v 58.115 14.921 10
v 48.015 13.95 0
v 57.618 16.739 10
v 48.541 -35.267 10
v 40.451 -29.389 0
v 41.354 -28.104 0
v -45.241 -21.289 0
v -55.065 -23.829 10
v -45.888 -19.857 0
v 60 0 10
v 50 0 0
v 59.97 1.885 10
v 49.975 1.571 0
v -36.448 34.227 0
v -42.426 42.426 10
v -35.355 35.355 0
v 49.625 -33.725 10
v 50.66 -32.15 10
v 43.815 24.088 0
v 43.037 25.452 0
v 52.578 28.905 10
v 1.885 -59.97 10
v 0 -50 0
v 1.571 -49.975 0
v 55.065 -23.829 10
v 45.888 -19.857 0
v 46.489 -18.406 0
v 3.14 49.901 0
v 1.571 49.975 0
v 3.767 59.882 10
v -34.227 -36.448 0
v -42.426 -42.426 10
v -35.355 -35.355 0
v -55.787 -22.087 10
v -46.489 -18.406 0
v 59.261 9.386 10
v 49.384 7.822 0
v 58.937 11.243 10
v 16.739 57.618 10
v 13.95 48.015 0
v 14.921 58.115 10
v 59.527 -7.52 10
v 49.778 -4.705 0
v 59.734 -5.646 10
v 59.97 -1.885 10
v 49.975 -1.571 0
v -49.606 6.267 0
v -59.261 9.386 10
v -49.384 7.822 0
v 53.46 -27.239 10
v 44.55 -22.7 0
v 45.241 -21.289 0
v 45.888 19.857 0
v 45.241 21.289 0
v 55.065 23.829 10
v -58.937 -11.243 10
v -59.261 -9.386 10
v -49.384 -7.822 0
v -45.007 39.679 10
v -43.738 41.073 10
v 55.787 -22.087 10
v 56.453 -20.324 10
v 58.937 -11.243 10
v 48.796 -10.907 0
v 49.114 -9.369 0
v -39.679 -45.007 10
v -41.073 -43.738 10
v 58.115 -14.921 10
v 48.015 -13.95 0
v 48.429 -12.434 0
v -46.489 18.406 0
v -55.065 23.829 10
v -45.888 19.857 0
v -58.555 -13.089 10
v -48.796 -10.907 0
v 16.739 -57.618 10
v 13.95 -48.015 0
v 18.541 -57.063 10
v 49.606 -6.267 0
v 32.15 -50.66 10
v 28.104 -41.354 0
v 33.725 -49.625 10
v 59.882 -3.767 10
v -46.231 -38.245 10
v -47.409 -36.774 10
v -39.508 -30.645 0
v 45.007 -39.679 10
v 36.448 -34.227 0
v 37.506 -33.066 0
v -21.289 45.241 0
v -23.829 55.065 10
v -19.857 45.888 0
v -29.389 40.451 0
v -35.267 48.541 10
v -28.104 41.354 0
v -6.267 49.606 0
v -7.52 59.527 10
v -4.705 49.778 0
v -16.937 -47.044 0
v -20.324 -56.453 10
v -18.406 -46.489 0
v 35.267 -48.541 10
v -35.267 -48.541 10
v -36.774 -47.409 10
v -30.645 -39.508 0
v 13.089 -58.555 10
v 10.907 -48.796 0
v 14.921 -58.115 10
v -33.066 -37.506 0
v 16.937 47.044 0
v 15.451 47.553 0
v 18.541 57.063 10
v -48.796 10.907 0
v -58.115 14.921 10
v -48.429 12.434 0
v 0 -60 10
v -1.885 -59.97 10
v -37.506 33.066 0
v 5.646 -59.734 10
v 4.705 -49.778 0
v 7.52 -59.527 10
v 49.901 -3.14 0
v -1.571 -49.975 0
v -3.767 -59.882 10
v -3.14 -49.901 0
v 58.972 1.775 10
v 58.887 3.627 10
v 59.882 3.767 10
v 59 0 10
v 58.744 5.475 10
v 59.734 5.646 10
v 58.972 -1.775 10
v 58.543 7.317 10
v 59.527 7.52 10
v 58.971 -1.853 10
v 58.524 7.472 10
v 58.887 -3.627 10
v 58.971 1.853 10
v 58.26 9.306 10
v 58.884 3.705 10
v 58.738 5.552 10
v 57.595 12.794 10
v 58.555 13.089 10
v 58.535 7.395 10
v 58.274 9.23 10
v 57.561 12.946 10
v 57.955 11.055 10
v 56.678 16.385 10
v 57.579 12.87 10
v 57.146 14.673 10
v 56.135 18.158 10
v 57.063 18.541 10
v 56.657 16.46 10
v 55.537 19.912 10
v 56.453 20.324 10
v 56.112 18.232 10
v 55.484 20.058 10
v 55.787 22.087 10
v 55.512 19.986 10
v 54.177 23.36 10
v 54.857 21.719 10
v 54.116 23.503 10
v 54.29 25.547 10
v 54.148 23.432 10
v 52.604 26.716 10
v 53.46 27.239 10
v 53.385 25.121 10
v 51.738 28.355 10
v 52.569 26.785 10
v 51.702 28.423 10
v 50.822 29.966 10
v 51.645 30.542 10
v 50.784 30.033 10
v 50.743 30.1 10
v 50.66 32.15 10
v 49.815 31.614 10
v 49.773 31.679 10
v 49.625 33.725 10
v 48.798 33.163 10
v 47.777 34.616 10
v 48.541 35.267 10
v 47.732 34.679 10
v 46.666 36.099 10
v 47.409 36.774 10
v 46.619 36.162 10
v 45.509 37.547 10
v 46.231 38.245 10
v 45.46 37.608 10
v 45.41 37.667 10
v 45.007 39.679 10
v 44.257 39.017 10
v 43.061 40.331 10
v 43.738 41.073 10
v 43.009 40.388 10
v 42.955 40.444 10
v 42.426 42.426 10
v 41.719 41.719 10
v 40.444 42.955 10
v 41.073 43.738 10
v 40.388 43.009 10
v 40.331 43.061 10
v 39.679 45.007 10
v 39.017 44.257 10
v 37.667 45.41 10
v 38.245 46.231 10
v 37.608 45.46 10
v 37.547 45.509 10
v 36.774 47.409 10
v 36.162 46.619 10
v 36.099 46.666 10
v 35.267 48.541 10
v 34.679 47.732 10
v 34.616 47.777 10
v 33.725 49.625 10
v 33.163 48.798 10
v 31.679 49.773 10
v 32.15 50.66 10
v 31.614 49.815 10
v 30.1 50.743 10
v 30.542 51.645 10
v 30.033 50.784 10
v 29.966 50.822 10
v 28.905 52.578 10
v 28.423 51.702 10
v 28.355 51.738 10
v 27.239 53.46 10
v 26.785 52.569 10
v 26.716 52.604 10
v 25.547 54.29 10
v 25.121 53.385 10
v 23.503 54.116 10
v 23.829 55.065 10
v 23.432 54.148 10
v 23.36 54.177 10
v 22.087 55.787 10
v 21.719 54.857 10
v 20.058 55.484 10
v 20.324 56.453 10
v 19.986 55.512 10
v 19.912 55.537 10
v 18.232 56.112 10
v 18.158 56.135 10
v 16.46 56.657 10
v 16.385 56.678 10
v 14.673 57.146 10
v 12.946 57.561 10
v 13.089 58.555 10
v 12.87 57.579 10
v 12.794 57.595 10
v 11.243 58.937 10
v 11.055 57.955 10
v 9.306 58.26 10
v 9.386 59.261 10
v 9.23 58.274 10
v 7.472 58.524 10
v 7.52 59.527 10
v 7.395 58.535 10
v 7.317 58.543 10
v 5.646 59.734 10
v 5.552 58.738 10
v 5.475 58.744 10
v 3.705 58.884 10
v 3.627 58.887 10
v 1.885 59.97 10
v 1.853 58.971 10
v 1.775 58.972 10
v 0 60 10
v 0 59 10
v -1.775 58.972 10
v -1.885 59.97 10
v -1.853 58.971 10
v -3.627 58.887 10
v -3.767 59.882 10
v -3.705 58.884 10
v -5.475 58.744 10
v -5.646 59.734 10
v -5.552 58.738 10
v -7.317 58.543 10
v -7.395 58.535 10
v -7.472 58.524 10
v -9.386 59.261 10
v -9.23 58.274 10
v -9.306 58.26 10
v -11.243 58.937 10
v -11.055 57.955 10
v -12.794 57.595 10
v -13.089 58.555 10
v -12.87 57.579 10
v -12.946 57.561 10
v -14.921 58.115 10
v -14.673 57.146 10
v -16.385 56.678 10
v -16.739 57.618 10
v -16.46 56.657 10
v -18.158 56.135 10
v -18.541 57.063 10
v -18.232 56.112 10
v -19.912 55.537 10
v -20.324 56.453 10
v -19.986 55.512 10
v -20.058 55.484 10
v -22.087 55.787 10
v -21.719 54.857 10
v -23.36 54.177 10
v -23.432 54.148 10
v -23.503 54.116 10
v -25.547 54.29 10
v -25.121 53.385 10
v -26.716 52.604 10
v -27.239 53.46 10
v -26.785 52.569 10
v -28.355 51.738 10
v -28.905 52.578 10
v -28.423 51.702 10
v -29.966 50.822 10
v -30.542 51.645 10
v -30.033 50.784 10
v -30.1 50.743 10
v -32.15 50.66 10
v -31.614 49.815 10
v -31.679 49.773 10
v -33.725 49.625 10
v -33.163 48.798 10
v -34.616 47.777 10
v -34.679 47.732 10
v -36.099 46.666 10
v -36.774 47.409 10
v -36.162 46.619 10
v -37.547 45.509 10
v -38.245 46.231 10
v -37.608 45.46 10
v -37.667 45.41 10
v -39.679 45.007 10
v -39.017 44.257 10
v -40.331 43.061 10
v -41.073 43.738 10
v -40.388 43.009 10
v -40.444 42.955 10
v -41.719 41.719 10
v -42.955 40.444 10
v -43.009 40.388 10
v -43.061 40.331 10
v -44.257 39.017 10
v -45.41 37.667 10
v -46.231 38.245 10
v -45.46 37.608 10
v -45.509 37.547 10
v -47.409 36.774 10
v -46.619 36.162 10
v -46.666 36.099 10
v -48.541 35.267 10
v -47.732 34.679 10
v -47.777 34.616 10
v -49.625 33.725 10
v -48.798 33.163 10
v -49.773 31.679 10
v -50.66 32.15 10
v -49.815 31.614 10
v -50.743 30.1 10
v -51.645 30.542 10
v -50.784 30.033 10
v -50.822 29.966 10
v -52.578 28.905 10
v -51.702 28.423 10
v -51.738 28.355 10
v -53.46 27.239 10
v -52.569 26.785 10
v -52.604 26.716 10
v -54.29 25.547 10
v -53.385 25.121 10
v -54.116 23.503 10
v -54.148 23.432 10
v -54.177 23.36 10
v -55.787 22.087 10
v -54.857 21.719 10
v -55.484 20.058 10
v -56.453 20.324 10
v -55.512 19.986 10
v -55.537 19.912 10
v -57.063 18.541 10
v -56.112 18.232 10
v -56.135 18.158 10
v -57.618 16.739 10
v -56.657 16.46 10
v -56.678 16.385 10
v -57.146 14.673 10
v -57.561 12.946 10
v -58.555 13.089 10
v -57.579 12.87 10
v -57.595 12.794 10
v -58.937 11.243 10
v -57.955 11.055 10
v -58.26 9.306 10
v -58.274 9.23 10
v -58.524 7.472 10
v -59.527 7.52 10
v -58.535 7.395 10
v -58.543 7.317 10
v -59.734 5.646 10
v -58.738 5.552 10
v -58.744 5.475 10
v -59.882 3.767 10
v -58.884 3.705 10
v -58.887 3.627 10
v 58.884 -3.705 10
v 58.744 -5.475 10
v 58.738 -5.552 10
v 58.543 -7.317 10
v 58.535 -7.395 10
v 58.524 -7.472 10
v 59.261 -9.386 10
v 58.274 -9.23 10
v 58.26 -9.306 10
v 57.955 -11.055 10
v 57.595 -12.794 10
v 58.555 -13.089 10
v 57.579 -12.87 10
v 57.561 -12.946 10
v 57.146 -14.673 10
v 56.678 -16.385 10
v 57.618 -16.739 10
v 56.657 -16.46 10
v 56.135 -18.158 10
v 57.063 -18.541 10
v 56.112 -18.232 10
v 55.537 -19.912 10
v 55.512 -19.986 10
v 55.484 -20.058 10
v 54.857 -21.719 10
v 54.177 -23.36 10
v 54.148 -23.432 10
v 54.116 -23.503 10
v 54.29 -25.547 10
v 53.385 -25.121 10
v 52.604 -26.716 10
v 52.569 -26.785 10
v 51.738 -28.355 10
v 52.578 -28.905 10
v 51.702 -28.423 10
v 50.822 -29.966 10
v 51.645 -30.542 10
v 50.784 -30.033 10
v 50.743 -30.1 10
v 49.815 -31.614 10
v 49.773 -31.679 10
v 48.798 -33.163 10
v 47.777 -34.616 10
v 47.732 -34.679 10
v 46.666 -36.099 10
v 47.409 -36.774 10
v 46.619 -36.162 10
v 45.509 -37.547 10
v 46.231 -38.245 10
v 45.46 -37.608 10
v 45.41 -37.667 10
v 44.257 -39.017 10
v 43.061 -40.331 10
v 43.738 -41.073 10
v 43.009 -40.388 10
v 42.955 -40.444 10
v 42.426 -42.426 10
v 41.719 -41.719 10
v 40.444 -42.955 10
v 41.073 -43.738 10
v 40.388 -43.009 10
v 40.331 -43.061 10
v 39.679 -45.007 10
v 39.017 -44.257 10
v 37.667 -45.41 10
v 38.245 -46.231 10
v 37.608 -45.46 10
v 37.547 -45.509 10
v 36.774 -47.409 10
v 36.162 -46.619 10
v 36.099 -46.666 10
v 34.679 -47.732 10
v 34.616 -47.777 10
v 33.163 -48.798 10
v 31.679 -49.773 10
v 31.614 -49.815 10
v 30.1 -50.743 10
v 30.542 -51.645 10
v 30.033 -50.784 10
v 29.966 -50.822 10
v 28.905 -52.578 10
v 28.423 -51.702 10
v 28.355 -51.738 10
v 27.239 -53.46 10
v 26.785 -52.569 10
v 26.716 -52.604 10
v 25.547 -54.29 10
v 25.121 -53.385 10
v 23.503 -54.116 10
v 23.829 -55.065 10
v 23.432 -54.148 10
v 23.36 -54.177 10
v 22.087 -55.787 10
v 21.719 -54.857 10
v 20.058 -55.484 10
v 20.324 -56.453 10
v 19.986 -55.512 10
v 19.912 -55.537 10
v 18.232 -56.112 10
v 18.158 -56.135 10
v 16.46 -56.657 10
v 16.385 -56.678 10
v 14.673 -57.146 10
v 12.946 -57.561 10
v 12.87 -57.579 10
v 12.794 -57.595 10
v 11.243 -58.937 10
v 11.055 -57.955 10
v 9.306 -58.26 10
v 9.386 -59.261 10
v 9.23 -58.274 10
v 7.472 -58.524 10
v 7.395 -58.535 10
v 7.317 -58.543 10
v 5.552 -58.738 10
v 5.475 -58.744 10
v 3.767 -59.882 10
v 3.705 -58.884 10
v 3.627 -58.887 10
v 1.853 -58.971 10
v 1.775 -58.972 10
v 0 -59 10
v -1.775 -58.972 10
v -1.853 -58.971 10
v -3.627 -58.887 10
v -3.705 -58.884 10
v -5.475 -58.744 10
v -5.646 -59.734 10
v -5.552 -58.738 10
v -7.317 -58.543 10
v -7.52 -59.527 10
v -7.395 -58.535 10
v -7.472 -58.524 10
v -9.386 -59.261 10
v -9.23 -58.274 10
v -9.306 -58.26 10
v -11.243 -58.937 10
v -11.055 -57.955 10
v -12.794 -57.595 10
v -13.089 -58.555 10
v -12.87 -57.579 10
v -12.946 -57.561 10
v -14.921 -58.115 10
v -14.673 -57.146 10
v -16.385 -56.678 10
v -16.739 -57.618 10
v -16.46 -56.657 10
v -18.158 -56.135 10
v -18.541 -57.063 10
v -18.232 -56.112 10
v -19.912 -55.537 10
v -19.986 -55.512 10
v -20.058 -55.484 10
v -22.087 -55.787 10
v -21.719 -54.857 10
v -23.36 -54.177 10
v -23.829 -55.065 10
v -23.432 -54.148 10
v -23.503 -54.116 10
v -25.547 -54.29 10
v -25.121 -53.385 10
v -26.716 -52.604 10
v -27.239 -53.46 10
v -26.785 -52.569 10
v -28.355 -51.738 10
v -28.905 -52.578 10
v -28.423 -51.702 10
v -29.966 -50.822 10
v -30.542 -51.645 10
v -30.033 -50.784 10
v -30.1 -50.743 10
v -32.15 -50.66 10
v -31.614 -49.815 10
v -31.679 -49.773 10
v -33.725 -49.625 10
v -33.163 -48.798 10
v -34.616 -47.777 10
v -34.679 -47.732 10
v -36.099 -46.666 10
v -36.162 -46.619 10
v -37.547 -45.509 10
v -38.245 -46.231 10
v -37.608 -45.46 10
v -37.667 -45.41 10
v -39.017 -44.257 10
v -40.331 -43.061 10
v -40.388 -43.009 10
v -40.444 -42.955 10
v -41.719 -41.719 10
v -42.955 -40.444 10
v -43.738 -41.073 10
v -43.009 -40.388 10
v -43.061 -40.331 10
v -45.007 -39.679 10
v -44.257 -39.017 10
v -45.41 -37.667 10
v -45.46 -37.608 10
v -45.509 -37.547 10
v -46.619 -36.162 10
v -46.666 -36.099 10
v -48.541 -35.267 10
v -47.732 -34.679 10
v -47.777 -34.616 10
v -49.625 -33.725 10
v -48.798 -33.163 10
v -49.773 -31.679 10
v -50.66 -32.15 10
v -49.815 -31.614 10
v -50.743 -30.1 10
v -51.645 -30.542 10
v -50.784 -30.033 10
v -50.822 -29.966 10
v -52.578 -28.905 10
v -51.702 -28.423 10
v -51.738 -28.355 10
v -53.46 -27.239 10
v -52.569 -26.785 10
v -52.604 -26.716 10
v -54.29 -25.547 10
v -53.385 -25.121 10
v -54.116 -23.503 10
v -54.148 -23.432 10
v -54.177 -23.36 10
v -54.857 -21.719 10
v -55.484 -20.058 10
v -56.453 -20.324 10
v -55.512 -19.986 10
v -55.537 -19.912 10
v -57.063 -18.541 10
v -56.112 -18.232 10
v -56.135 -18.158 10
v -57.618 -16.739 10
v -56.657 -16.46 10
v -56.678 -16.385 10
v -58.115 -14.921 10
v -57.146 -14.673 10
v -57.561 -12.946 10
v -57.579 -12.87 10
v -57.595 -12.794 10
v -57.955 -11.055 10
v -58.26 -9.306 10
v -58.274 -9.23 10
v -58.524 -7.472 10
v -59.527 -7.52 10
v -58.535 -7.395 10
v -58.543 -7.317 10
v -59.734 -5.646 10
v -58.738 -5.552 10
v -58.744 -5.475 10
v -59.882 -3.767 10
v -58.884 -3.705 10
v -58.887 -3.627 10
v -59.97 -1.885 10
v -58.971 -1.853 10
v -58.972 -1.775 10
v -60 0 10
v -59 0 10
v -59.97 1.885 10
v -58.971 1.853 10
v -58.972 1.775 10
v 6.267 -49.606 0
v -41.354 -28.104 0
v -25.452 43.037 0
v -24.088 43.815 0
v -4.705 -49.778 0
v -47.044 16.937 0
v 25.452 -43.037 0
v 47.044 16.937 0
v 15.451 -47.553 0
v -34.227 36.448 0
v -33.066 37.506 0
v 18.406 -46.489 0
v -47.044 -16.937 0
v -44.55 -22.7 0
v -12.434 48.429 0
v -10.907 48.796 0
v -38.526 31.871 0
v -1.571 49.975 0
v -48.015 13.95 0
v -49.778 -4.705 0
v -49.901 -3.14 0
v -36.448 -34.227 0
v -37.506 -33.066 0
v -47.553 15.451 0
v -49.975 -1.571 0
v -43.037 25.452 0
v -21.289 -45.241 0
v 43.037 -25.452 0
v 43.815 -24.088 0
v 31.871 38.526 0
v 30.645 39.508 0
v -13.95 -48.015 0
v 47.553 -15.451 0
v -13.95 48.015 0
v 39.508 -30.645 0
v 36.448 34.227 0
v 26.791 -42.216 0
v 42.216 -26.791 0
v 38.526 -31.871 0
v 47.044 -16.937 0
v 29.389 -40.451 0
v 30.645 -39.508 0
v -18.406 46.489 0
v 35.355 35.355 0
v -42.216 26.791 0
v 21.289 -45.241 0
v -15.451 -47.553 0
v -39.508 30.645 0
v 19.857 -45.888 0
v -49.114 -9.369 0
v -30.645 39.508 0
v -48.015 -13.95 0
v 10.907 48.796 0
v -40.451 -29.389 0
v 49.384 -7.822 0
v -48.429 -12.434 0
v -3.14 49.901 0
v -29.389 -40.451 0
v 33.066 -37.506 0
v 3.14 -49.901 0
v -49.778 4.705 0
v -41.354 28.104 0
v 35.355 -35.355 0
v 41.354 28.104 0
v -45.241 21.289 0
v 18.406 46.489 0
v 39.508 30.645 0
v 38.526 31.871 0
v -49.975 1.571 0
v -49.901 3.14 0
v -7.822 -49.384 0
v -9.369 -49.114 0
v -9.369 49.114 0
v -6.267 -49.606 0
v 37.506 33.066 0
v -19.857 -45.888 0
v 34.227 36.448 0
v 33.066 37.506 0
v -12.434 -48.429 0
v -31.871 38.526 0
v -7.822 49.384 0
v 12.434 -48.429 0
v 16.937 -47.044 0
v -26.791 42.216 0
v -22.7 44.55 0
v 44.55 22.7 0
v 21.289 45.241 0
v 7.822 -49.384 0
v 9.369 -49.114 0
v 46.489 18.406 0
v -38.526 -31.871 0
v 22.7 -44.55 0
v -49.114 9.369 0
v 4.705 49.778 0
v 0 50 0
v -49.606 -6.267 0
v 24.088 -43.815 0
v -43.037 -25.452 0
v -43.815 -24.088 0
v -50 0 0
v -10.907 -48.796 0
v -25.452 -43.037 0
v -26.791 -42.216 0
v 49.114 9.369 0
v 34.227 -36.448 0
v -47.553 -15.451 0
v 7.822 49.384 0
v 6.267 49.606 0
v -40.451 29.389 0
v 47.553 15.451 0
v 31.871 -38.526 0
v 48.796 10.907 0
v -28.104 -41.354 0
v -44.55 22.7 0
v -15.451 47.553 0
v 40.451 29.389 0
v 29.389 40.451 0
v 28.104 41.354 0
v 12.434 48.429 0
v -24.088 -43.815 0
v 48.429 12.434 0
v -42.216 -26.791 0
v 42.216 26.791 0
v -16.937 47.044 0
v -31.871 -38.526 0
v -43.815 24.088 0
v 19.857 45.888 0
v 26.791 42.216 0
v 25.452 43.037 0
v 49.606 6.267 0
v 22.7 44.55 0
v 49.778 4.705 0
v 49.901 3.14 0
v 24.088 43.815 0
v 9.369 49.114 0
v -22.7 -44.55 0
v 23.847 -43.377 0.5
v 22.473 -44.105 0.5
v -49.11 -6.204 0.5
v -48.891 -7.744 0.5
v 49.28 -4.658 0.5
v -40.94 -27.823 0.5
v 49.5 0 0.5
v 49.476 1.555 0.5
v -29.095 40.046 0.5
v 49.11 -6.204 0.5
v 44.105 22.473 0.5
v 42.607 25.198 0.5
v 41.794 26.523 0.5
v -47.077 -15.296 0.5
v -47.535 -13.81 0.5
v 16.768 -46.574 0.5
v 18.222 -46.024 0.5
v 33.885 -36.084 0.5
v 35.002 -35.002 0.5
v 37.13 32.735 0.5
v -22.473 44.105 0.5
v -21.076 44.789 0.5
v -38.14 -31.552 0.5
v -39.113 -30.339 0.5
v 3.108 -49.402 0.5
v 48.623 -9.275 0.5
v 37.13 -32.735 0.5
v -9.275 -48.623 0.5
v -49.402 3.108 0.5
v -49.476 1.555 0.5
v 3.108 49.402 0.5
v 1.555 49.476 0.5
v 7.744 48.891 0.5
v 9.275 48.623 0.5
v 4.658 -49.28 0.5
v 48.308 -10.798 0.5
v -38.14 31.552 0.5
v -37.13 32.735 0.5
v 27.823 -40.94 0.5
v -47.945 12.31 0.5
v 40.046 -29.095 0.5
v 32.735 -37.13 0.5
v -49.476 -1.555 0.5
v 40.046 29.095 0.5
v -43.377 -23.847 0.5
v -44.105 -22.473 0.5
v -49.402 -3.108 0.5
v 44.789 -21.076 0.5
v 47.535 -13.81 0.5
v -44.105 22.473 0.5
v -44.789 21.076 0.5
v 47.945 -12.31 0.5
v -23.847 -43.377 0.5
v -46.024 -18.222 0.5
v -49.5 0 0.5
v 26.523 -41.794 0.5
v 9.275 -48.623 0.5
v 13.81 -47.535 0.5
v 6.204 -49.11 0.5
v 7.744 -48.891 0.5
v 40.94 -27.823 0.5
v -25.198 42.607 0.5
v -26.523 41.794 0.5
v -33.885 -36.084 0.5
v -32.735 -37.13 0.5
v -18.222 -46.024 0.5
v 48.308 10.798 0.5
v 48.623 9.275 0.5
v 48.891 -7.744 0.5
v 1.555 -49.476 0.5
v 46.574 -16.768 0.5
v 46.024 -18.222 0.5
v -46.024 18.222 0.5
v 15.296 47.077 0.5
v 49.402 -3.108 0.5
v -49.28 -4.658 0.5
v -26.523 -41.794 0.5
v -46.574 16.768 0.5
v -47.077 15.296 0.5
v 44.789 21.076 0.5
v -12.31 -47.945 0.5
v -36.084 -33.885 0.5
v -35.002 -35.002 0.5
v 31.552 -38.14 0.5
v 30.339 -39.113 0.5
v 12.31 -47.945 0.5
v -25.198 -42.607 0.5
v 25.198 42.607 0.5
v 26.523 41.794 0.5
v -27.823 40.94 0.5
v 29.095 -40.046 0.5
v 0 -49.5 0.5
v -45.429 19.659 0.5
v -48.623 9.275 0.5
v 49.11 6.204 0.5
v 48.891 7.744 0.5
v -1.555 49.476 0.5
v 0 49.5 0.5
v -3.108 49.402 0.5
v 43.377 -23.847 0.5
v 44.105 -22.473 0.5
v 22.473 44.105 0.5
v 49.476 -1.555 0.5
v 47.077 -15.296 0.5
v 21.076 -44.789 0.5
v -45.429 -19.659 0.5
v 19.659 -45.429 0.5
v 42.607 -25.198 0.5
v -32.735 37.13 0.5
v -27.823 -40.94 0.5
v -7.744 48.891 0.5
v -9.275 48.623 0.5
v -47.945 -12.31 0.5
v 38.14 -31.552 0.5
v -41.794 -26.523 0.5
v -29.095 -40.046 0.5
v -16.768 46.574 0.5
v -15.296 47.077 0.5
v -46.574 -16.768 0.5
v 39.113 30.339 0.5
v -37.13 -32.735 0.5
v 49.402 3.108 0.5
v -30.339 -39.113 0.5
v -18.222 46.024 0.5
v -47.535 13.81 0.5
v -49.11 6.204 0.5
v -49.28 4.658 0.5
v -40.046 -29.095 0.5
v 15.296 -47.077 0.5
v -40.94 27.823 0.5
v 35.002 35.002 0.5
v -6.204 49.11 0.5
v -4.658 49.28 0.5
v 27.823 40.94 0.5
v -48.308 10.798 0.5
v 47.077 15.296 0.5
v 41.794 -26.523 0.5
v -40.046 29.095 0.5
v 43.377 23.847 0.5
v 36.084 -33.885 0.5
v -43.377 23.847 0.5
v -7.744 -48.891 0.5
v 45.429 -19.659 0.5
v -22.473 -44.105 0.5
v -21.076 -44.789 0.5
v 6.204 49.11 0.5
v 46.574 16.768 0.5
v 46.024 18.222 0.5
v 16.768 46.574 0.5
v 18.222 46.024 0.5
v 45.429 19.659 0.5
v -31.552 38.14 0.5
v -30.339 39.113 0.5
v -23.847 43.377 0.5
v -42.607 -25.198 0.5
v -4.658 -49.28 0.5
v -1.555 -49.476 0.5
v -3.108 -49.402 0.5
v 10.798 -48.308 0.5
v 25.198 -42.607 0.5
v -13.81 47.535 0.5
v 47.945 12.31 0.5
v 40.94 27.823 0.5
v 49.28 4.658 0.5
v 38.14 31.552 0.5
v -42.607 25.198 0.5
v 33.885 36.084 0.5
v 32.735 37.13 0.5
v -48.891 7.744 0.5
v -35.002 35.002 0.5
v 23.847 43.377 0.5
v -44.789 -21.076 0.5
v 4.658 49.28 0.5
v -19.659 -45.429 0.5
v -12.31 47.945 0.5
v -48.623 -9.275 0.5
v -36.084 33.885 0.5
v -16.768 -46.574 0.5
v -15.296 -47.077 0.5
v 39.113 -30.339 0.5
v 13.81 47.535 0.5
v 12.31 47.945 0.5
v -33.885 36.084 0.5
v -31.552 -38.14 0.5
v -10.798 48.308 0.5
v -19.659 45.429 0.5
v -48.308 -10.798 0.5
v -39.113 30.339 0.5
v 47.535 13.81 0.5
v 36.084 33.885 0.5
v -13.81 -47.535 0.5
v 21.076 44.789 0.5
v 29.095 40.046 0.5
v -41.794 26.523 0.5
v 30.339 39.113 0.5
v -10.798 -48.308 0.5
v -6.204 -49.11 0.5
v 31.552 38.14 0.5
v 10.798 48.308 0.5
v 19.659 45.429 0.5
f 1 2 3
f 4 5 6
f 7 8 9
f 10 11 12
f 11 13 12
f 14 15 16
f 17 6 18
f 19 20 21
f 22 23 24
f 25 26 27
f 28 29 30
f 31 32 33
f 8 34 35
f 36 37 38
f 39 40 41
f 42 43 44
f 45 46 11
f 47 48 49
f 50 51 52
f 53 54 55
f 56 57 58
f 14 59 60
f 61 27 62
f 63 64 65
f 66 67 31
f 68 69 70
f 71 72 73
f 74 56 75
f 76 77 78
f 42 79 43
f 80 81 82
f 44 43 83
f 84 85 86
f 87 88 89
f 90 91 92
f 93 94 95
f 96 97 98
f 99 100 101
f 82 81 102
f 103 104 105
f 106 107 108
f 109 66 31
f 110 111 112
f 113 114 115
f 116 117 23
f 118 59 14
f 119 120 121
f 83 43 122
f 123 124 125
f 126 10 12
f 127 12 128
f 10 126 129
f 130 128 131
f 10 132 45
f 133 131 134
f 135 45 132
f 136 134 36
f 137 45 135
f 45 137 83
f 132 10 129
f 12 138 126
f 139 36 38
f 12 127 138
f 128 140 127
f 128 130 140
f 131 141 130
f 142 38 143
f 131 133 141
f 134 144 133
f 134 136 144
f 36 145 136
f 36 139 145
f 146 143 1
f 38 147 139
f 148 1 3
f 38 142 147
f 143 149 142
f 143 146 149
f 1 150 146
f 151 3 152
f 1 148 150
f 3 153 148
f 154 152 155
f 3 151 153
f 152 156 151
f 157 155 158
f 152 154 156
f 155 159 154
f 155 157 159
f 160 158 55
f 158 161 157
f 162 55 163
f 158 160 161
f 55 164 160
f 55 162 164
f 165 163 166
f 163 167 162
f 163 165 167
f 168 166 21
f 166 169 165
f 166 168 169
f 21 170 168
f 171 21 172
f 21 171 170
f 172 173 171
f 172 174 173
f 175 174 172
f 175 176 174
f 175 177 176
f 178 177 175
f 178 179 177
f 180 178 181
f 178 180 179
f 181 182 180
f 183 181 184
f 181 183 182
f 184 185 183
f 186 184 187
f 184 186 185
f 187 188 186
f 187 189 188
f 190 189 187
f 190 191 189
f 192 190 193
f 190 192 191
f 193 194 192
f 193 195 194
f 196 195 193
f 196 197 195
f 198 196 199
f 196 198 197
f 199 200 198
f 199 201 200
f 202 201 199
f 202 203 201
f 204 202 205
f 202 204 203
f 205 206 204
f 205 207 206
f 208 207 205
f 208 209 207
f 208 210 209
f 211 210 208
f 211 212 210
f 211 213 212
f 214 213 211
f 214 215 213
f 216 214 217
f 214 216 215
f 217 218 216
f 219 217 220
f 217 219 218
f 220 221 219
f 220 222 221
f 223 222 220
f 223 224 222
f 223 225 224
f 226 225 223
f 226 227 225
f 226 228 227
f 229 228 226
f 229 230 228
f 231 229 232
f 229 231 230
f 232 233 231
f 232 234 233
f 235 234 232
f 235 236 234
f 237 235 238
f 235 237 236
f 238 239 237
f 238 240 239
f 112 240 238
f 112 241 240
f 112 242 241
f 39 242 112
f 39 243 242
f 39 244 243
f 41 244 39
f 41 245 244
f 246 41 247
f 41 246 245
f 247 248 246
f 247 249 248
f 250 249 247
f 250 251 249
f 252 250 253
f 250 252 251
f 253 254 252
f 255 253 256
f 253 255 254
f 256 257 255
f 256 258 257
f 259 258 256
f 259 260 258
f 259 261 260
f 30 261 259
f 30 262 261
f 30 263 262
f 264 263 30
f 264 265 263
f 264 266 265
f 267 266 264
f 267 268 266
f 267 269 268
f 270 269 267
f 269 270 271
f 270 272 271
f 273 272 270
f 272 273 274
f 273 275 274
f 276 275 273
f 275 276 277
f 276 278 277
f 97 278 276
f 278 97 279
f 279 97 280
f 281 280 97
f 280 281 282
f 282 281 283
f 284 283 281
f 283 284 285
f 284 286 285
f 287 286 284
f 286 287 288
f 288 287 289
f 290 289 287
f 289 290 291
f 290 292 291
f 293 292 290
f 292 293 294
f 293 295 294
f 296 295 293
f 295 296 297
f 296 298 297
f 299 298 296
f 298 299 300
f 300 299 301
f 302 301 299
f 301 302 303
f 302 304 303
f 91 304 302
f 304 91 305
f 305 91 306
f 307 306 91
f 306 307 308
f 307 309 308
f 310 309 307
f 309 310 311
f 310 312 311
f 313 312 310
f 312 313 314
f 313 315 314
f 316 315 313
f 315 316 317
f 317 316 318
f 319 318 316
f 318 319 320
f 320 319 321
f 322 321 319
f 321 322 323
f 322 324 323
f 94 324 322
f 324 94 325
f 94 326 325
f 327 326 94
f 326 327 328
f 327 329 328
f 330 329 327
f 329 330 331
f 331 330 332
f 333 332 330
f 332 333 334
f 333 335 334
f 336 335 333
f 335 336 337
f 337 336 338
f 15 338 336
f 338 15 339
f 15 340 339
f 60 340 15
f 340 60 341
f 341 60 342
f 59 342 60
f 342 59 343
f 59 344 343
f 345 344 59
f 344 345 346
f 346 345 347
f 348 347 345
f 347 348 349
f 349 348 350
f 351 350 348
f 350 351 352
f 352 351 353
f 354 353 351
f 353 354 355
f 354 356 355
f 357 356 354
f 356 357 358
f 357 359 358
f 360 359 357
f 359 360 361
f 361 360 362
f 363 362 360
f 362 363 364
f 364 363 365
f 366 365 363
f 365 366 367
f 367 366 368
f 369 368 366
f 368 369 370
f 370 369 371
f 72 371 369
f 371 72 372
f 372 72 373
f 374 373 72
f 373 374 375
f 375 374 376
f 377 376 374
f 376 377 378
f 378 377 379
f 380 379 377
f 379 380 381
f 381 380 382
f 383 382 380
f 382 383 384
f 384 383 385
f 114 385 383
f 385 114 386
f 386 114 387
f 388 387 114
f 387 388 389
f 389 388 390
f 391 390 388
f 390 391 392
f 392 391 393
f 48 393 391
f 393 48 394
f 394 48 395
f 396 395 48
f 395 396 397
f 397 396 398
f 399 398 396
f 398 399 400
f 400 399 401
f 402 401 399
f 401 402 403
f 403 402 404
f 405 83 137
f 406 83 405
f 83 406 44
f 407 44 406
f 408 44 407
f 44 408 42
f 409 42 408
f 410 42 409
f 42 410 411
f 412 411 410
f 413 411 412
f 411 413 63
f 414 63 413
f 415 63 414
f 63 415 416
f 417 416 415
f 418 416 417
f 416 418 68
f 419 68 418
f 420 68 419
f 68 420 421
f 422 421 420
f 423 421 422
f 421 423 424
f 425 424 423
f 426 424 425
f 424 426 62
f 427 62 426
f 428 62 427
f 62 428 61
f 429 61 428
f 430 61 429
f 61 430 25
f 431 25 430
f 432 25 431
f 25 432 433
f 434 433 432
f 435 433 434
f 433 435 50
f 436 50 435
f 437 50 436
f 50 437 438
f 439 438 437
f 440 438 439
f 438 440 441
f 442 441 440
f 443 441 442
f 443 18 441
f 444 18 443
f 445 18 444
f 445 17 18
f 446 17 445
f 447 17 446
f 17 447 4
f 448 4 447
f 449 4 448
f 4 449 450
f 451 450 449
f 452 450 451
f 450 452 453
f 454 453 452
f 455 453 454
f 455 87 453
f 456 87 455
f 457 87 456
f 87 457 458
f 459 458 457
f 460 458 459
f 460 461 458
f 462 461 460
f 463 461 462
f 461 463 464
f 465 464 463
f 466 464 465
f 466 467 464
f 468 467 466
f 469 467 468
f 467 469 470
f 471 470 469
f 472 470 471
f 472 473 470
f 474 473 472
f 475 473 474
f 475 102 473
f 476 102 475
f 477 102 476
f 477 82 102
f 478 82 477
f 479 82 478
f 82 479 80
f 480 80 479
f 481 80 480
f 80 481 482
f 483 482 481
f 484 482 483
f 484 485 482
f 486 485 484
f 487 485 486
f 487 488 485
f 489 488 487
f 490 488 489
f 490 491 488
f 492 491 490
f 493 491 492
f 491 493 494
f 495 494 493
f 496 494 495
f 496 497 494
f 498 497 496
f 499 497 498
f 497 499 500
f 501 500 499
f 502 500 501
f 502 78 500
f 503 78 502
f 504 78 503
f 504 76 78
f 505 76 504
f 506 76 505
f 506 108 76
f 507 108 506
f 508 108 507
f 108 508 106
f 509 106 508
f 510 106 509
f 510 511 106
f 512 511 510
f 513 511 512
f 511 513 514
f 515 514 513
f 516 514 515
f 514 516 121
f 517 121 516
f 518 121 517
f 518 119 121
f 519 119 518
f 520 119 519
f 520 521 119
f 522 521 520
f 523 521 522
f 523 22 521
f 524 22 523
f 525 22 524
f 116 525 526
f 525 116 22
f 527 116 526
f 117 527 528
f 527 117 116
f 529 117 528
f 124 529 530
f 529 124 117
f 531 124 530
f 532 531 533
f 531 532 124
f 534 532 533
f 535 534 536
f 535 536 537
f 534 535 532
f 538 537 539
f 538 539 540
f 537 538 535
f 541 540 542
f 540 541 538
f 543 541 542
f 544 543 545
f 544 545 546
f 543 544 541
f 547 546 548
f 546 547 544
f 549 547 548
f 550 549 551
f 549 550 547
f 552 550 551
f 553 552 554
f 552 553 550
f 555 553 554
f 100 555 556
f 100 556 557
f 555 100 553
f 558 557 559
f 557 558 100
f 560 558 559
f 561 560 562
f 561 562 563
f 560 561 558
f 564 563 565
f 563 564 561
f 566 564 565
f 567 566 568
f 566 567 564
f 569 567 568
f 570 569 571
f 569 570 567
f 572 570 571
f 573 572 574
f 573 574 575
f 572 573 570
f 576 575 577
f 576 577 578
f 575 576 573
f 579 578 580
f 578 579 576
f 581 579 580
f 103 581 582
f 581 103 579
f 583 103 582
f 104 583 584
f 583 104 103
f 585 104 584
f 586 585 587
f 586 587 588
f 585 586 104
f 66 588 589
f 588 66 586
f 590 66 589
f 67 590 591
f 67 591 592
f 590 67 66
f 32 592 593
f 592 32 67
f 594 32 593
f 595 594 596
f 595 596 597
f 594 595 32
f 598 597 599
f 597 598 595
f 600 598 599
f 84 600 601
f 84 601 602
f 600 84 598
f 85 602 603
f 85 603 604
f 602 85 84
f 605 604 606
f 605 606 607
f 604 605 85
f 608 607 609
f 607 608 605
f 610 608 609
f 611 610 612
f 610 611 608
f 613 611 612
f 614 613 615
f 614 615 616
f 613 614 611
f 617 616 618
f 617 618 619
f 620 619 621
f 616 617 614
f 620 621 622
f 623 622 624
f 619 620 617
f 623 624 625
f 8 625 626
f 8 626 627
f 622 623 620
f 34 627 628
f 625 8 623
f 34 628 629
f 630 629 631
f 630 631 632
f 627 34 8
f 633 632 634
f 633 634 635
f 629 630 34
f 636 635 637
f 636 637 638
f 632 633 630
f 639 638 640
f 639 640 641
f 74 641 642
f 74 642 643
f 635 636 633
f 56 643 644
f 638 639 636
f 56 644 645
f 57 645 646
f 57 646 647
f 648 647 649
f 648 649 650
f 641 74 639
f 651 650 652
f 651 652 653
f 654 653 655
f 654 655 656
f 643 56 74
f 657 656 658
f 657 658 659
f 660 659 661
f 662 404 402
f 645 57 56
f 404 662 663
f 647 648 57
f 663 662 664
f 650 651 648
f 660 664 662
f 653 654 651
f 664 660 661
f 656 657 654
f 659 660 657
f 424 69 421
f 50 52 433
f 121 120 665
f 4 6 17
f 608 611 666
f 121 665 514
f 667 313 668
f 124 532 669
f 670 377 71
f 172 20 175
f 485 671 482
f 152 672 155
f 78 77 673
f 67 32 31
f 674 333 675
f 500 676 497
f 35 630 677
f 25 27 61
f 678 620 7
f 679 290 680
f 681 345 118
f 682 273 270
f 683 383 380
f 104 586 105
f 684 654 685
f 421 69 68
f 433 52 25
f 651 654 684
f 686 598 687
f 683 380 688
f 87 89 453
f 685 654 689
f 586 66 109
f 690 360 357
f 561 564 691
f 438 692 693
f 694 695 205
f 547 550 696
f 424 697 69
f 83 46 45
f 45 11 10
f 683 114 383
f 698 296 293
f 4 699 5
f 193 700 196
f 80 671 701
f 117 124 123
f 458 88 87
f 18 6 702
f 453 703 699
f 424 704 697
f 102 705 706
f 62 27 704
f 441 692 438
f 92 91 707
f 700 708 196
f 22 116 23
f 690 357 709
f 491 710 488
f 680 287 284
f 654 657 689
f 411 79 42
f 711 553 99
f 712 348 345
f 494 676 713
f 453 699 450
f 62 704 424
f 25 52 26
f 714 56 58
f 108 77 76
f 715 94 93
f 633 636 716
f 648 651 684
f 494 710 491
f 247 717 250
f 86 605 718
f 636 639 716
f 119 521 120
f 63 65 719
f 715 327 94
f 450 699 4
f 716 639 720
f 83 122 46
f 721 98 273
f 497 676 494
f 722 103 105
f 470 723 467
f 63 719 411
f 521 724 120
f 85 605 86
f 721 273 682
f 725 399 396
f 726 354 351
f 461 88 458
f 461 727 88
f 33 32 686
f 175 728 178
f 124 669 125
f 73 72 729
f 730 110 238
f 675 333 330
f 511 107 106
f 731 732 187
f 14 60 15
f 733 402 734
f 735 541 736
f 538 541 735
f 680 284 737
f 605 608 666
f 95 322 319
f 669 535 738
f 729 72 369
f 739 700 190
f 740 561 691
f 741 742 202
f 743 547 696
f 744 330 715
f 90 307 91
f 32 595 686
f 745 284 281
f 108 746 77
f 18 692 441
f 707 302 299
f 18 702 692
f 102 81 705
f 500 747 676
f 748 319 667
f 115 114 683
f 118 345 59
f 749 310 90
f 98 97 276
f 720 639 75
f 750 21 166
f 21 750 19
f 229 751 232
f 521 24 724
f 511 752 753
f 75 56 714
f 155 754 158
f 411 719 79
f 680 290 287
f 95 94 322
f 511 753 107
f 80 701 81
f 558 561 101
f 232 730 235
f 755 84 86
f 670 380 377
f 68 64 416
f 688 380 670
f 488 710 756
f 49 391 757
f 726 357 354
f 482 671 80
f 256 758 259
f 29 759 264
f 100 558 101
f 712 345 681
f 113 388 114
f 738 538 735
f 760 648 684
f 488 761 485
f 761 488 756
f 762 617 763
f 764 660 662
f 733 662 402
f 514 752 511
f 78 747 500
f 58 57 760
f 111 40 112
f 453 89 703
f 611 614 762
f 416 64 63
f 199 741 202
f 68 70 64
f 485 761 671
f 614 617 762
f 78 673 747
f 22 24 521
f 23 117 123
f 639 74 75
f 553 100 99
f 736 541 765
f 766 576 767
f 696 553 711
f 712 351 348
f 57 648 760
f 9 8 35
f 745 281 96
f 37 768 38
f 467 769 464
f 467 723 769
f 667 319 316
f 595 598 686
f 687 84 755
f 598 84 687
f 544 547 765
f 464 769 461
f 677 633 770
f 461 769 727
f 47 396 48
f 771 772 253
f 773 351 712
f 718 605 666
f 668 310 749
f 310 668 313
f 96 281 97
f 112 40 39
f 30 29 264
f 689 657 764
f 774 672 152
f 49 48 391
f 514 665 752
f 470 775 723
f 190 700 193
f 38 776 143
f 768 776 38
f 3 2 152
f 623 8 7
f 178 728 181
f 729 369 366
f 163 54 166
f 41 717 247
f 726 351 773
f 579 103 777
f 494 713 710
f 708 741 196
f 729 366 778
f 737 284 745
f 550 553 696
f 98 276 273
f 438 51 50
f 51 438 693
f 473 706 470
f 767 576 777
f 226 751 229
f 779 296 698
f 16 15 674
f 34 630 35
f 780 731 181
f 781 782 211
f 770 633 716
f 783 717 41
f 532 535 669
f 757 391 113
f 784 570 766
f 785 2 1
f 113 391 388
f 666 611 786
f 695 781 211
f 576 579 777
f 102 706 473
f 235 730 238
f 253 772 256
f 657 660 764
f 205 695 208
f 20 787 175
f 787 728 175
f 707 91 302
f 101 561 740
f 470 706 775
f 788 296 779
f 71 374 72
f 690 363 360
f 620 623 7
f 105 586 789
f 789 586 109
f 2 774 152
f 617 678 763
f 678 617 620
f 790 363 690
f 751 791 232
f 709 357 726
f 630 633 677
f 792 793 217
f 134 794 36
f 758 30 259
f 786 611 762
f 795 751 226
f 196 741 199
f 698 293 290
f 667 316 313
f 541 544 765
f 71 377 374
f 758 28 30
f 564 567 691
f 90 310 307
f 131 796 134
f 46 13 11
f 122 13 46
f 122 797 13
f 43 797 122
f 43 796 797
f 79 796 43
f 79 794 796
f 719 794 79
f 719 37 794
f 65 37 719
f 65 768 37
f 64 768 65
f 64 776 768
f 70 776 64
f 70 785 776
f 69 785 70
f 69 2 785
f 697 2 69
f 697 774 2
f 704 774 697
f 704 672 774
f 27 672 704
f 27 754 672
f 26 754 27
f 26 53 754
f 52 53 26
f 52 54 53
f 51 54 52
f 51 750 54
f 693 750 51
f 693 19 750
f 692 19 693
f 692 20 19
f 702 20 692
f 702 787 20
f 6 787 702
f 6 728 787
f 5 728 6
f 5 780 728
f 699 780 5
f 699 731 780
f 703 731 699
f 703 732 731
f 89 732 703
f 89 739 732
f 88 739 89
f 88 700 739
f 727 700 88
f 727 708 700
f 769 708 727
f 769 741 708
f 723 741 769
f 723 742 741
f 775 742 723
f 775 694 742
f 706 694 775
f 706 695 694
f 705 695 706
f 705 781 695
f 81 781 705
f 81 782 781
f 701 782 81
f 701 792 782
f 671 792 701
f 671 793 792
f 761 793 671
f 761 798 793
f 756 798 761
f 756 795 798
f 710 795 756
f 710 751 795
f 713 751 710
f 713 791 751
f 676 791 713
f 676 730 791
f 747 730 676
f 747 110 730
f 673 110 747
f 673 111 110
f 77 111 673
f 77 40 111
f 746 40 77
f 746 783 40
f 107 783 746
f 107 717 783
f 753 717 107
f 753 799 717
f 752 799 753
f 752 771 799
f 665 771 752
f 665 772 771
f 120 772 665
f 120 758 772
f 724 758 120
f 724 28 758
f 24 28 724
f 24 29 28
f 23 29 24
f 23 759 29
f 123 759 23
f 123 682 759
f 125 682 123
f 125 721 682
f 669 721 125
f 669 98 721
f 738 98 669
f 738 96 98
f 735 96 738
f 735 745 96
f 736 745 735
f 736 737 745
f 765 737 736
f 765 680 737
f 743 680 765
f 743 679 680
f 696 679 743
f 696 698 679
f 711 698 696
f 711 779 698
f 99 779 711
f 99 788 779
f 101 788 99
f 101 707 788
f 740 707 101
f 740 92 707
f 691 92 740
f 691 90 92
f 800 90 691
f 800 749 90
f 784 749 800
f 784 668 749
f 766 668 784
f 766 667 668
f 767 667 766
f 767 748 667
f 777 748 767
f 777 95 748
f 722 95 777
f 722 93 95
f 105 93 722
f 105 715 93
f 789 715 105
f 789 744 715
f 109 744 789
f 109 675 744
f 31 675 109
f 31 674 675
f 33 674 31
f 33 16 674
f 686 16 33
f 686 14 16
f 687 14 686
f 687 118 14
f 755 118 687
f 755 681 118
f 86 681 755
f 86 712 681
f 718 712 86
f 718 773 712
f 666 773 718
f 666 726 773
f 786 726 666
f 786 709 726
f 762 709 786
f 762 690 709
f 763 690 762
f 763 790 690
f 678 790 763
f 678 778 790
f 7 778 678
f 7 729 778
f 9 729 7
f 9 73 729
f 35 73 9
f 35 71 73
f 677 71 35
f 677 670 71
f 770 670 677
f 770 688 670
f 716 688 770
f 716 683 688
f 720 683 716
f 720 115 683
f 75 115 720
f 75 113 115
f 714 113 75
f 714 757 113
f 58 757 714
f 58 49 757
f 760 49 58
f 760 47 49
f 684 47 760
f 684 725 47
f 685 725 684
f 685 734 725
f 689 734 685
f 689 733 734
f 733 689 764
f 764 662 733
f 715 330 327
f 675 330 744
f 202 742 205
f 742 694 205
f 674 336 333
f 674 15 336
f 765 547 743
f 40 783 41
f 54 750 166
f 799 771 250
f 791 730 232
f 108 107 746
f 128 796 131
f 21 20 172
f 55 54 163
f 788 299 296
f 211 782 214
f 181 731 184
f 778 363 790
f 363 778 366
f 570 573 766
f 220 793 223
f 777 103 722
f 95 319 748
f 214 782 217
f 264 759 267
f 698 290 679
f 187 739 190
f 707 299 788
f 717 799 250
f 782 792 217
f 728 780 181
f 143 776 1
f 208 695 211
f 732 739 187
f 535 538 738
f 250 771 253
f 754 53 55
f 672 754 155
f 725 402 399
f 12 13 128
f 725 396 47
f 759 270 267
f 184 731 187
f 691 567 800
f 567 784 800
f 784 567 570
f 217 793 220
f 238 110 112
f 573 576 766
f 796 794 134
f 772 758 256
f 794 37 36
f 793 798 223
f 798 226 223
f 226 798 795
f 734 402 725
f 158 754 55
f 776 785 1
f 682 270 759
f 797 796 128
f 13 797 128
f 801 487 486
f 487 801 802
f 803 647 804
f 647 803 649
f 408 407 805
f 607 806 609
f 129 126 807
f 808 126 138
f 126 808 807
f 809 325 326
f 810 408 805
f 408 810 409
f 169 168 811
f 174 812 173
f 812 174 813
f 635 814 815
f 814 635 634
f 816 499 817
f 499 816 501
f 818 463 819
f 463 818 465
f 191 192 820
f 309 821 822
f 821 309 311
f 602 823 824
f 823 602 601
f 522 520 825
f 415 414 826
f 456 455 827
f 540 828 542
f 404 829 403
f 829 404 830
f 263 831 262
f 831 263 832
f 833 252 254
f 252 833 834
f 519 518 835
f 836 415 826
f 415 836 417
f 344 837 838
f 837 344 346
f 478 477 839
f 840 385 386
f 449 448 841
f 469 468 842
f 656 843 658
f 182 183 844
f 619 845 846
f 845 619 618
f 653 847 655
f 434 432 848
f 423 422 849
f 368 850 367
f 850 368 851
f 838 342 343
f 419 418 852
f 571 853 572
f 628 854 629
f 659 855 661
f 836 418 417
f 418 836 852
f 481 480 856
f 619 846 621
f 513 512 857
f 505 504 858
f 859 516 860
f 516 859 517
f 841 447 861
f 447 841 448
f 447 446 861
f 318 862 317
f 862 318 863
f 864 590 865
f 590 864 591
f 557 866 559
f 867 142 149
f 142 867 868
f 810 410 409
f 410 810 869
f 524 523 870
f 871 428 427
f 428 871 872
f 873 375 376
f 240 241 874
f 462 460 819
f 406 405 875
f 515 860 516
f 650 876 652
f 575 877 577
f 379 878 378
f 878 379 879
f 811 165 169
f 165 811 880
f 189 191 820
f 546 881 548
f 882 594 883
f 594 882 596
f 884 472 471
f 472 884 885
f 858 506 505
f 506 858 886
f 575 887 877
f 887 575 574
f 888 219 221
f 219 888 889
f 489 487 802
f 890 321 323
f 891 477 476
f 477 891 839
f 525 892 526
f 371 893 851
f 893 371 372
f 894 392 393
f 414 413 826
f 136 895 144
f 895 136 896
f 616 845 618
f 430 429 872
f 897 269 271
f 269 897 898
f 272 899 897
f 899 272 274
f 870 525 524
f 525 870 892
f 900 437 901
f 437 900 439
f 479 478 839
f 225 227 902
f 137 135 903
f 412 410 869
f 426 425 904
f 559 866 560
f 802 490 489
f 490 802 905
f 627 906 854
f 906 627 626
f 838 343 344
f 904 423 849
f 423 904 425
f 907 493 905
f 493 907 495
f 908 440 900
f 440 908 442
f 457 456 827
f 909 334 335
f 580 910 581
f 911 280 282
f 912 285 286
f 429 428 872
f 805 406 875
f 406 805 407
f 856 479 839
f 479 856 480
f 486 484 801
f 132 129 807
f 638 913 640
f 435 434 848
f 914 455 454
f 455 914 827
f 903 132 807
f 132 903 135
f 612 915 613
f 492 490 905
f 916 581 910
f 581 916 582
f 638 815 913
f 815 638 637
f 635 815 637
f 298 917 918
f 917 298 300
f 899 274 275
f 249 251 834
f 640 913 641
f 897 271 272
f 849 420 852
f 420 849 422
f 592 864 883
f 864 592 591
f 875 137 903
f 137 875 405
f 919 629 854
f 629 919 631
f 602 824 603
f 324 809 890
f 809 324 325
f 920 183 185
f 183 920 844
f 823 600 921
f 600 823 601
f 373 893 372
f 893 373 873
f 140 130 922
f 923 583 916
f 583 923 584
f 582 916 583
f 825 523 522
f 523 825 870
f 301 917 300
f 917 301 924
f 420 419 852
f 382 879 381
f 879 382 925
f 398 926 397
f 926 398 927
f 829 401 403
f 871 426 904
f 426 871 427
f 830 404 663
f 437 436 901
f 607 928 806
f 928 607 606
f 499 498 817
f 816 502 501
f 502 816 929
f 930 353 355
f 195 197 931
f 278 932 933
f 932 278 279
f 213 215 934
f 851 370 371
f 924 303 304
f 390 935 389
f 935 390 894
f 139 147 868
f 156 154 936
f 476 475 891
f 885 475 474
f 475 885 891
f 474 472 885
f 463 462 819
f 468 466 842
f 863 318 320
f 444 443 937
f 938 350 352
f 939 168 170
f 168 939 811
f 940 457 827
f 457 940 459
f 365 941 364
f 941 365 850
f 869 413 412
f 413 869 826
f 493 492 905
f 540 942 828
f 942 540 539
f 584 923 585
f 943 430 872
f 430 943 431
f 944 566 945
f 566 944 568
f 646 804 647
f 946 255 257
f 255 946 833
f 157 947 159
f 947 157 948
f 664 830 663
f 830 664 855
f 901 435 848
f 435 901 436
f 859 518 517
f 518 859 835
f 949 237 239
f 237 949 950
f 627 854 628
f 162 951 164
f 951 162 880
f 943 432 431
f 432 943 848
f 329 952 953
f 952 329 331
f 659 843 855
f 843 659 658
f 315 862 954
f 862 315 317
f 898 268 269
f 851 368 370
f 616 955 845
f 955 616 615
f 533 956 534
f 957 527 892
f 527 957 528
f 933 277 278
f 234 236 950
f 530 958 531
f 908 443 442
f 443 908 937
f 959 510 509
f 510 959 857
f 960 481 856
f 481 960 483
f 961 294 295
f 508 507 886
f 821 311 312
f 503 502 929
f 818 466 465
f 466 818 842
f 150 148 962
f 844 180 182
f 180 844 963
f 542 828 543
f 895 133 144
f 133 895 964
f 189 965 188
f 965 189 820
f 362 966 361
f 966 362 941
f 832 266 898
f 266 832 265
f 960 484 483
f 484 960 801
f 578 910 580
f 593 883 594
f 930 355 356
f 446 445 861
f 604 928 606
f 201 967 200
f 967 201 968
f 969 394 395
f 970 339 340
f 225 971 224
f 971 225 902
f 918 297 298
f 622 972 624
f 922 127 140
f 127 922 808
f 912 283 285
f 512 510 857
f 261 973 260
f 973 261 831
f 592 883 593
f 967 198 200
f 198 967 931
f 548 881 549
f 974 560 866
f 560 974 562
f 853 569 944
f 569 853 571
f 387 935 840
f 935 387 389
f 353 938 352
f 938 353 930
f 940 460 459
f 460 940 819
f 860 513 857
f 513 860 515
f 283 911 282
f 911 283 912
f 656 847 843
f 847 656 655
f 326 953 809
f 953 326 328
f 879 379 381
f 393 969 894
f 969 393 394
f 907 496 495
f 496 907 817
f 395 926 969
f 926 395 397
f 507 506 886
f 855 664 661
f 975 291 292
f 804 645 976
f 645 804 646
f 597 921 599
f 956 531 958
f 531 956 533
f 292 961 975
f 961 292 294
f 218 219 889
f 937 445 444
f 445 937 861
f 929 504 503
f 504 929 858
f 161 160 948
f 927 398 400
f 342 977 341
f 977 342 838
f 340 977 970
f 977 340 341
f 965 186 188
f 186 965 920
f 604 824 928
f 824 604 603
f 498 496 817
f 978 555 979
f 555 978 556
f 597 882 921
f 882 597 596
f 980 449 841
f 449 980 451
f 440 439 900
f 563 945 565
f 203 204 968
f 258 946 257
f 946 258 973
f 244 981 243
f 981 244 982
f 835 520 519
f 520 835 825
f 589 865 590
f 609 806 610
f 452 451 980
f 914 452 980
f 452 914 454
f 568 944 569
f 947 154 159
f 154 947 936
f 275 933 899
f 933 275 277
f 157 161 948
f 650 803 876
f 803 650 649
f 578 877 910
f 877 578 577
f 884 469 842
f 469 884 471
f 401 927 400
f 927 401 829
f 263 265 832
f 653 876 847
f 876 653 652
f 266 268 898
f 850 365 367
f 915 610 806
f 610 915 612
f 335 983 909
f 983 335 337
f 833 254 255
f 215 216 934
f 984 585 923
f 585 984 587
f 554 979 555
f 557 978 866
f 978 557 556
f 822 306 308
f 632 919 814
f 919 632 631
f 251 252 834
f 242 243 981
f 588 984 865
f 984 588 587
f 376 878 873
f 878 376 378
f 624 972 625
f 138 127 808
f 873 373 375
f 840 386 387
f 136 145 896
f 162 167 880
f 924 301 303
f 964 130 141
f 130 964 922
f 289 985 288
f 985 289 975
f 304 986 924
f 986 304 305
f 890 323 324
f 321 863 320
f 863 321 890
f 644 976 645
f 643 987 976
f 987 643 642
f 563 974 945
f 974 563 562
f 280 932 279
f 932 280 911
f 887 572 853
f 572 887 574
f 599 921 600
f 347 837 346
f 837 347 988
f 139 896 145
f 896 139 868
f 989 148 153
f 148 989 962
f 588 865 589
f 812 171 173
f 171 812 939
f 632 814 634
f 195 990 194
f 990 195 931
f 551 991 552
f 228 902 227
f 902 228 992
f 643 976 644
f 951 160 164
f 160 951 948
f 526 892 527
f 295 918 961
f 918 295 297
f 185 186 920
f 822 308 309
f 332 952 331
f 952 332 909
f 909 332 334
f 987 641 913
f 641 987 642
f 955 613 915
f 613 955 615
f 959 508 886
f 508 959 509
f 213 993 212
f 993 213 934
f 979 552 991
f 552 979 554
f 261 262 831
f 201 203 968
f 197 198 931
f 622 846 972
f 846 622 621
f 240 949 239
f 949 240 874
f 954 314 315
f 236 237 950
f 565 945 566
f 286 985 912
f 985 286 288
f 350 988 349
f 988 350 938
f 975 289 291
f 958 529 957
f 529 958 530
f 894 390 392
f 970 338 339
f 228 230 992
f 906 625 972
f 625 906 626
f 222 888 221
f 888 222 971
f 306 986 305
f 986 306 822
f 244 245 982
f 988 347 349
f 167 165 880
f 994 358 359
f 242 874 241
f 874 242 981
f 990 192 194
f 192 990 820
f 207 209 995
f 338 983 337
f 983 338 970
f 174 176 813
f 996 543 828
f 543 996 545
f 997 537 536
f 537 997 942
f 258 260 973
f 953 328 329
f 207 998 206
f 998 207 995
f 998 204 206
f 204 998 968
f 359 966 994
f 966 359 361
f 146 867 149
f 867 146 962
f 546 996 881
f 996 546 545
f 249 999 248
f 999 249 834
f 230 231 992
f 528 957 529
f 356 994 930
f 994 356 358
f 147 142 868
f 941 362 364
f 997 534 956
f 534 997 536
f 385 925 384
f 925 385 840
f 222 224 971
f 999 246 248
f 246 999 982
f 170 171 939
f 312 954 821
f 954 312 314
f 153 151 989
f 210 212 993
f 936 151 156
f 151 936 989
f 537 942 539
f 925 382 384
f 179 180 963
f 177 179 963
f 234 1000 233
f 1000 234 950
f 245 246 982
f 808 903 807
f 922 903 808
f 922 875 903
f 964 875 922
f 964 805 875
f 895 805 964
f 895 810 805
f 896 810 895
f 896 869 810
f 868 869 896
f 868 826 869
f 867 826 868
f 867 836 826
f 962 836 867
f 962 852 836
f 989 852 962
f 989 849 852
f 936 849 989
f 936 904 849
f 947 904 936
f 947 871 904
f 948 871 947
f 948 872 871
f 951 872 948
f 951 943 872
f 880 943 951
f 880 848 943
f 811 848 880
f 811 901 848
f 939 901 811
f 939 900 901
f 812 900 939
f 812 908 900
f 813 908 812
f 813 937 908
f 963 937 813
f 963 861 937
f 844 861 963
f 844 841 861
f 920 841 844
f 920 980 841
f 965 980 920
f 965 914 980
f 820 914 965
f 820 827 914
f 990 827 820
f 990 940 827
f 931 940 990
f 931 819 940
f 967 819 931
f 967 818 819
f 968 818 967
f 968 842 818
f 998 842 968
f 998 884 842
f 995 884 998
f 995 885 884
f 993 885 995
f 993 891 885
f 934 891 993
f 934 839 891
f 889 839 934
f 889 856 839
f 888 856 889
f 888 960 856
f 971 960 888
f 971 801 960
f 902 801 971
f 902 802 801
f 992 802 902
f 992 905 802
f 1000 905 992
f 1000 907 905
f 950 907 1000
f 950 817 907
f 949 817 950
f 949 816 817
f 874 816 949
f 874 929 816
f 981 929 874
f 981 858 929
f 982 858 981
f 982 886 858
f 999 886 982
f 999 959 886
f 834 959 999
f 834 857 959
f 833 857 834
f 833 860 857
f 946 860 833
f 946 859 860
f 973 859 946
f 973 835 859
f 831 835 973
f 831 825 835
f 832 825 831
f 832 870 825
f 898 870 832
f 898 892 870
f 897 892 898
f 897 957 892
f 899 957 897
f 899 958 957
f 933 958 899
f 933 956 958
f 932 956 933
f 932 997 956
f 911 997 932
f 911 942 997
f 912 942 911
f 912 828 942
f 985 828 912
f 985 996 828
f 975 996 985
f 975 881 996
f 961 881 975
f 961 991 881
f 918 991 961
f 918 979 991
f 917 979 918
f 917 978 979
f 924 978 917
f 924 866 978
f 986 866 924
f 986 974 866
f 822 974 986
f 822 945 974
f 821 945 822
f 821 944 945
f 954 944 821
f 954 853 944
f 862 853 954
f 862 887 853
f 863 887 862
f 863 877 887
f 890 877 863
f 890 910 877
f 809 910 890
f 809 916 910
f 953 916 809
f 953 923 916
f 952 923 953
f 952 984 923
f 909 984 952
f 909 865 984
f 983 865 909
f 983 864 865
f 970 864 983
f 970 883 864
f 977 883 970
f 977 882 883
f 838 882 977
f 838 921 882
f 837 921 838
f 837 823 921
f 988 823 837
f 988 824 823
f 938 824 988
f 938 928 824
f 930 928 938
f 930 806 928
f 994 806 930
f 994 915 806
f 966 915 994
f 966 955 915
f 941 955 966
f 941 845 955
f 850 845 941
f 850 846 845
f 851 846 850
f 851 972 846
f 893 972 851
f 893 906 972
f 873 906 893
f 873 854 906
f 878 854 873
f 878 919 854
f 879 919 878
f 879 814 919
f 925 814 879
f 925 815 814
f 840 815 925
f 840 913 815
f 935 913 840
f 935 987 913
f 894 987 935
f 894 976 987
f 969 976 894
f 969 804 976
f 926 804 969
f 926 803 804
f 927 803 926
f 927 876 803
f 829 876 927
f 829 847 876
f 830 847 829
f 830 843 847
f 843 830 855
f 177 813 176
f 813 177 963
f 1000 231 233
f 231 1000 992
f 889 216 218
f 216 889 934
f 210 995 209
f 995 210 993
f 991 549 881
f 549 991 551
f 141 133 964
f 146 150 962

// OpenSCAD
diameter = 100; // base diameter in mm
height = 10; // coaster height in mm
thickness = 0.5; // wall thickness in mm

type = "cone"; // ["cone", "normal"]

hump = true;

quality = 200; // FN quality

$fn = quality;

module base_cone() {
    difference() {
        cylinder(height, r1=diameter/2, r2=diameter/2 + height);
        translate([0,0,thickness])
        cylinder(height, r1=diameter/2 - thickness, r2=diameter/2 + height - thickness);
    }
}

module base_normal() {
    difference() {
        cylinder(height, r=diameter/2);
        translate([0,0,thickness])
        cylinder(height, r=diameter/2 - thickness);
    }
}


if (type == "cone") {
    base_cone();
} else if (type == "normal") {
    base_normal();
}
